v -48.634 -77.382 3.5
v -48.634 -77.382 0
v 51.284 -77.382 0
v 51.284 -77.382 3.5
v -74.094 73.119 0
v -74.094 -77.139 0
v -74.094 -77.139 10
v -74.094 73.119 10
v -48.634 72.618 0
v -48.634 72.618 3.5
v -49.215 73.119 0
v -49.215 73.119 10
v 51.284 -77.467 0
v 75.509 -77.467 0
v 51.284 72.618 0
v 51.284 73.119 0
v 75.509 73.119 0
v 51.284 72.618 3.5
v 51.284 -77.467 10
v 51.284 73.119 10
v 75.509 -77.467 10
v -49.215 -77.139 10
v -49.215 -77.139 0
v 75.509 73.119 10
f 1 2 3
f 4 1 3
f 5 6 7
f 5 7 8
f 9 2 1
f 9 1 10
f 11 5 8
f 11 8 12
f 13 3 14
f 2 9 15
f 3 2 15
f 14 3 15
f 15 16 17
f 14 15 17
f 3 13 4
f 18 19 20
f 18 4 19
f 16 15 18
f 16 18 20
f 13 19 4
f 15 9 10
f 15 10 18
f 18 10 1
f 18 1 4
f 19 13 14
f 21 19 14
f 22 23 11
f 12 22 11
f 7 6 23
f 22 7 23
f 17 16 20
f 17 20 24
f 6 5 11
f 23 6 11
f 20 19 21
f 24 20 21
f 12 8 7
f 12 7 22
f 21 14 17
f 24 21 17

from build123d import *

# Parameters (mm, degrees)
F0_W     = 100
F0_H     = 150
F1_DEPTH = 3.5
F2_W     = 24.879296
F2_H     = 150.257848
F2_W_2   = 24.224576
F2_H_2   = 150.585204
F3_DEPTH = 10


with BuildPart() as f1:
    # F0 (on Top) → F1 (new body)
    with BuildSketch(Plane.XY):
        with Locations((1.366267, -2.382289)):
            Rectangle(F0_W, F0_H)
    extrude(amount=F1_DEPTH)

    # F2 (on Top) → F3 (join)
    with BuildSketch(Plane.XY):
        with Locations((-61.65467, -2.010349)):
            Rectangle(F2_W, F2_H)
        with Locations((63.396523, -2.174027)):
            Rectangle(F2_W_2, F2_H_2)
    extrude(amount=F3_DEPTH)


solid = f1.part
